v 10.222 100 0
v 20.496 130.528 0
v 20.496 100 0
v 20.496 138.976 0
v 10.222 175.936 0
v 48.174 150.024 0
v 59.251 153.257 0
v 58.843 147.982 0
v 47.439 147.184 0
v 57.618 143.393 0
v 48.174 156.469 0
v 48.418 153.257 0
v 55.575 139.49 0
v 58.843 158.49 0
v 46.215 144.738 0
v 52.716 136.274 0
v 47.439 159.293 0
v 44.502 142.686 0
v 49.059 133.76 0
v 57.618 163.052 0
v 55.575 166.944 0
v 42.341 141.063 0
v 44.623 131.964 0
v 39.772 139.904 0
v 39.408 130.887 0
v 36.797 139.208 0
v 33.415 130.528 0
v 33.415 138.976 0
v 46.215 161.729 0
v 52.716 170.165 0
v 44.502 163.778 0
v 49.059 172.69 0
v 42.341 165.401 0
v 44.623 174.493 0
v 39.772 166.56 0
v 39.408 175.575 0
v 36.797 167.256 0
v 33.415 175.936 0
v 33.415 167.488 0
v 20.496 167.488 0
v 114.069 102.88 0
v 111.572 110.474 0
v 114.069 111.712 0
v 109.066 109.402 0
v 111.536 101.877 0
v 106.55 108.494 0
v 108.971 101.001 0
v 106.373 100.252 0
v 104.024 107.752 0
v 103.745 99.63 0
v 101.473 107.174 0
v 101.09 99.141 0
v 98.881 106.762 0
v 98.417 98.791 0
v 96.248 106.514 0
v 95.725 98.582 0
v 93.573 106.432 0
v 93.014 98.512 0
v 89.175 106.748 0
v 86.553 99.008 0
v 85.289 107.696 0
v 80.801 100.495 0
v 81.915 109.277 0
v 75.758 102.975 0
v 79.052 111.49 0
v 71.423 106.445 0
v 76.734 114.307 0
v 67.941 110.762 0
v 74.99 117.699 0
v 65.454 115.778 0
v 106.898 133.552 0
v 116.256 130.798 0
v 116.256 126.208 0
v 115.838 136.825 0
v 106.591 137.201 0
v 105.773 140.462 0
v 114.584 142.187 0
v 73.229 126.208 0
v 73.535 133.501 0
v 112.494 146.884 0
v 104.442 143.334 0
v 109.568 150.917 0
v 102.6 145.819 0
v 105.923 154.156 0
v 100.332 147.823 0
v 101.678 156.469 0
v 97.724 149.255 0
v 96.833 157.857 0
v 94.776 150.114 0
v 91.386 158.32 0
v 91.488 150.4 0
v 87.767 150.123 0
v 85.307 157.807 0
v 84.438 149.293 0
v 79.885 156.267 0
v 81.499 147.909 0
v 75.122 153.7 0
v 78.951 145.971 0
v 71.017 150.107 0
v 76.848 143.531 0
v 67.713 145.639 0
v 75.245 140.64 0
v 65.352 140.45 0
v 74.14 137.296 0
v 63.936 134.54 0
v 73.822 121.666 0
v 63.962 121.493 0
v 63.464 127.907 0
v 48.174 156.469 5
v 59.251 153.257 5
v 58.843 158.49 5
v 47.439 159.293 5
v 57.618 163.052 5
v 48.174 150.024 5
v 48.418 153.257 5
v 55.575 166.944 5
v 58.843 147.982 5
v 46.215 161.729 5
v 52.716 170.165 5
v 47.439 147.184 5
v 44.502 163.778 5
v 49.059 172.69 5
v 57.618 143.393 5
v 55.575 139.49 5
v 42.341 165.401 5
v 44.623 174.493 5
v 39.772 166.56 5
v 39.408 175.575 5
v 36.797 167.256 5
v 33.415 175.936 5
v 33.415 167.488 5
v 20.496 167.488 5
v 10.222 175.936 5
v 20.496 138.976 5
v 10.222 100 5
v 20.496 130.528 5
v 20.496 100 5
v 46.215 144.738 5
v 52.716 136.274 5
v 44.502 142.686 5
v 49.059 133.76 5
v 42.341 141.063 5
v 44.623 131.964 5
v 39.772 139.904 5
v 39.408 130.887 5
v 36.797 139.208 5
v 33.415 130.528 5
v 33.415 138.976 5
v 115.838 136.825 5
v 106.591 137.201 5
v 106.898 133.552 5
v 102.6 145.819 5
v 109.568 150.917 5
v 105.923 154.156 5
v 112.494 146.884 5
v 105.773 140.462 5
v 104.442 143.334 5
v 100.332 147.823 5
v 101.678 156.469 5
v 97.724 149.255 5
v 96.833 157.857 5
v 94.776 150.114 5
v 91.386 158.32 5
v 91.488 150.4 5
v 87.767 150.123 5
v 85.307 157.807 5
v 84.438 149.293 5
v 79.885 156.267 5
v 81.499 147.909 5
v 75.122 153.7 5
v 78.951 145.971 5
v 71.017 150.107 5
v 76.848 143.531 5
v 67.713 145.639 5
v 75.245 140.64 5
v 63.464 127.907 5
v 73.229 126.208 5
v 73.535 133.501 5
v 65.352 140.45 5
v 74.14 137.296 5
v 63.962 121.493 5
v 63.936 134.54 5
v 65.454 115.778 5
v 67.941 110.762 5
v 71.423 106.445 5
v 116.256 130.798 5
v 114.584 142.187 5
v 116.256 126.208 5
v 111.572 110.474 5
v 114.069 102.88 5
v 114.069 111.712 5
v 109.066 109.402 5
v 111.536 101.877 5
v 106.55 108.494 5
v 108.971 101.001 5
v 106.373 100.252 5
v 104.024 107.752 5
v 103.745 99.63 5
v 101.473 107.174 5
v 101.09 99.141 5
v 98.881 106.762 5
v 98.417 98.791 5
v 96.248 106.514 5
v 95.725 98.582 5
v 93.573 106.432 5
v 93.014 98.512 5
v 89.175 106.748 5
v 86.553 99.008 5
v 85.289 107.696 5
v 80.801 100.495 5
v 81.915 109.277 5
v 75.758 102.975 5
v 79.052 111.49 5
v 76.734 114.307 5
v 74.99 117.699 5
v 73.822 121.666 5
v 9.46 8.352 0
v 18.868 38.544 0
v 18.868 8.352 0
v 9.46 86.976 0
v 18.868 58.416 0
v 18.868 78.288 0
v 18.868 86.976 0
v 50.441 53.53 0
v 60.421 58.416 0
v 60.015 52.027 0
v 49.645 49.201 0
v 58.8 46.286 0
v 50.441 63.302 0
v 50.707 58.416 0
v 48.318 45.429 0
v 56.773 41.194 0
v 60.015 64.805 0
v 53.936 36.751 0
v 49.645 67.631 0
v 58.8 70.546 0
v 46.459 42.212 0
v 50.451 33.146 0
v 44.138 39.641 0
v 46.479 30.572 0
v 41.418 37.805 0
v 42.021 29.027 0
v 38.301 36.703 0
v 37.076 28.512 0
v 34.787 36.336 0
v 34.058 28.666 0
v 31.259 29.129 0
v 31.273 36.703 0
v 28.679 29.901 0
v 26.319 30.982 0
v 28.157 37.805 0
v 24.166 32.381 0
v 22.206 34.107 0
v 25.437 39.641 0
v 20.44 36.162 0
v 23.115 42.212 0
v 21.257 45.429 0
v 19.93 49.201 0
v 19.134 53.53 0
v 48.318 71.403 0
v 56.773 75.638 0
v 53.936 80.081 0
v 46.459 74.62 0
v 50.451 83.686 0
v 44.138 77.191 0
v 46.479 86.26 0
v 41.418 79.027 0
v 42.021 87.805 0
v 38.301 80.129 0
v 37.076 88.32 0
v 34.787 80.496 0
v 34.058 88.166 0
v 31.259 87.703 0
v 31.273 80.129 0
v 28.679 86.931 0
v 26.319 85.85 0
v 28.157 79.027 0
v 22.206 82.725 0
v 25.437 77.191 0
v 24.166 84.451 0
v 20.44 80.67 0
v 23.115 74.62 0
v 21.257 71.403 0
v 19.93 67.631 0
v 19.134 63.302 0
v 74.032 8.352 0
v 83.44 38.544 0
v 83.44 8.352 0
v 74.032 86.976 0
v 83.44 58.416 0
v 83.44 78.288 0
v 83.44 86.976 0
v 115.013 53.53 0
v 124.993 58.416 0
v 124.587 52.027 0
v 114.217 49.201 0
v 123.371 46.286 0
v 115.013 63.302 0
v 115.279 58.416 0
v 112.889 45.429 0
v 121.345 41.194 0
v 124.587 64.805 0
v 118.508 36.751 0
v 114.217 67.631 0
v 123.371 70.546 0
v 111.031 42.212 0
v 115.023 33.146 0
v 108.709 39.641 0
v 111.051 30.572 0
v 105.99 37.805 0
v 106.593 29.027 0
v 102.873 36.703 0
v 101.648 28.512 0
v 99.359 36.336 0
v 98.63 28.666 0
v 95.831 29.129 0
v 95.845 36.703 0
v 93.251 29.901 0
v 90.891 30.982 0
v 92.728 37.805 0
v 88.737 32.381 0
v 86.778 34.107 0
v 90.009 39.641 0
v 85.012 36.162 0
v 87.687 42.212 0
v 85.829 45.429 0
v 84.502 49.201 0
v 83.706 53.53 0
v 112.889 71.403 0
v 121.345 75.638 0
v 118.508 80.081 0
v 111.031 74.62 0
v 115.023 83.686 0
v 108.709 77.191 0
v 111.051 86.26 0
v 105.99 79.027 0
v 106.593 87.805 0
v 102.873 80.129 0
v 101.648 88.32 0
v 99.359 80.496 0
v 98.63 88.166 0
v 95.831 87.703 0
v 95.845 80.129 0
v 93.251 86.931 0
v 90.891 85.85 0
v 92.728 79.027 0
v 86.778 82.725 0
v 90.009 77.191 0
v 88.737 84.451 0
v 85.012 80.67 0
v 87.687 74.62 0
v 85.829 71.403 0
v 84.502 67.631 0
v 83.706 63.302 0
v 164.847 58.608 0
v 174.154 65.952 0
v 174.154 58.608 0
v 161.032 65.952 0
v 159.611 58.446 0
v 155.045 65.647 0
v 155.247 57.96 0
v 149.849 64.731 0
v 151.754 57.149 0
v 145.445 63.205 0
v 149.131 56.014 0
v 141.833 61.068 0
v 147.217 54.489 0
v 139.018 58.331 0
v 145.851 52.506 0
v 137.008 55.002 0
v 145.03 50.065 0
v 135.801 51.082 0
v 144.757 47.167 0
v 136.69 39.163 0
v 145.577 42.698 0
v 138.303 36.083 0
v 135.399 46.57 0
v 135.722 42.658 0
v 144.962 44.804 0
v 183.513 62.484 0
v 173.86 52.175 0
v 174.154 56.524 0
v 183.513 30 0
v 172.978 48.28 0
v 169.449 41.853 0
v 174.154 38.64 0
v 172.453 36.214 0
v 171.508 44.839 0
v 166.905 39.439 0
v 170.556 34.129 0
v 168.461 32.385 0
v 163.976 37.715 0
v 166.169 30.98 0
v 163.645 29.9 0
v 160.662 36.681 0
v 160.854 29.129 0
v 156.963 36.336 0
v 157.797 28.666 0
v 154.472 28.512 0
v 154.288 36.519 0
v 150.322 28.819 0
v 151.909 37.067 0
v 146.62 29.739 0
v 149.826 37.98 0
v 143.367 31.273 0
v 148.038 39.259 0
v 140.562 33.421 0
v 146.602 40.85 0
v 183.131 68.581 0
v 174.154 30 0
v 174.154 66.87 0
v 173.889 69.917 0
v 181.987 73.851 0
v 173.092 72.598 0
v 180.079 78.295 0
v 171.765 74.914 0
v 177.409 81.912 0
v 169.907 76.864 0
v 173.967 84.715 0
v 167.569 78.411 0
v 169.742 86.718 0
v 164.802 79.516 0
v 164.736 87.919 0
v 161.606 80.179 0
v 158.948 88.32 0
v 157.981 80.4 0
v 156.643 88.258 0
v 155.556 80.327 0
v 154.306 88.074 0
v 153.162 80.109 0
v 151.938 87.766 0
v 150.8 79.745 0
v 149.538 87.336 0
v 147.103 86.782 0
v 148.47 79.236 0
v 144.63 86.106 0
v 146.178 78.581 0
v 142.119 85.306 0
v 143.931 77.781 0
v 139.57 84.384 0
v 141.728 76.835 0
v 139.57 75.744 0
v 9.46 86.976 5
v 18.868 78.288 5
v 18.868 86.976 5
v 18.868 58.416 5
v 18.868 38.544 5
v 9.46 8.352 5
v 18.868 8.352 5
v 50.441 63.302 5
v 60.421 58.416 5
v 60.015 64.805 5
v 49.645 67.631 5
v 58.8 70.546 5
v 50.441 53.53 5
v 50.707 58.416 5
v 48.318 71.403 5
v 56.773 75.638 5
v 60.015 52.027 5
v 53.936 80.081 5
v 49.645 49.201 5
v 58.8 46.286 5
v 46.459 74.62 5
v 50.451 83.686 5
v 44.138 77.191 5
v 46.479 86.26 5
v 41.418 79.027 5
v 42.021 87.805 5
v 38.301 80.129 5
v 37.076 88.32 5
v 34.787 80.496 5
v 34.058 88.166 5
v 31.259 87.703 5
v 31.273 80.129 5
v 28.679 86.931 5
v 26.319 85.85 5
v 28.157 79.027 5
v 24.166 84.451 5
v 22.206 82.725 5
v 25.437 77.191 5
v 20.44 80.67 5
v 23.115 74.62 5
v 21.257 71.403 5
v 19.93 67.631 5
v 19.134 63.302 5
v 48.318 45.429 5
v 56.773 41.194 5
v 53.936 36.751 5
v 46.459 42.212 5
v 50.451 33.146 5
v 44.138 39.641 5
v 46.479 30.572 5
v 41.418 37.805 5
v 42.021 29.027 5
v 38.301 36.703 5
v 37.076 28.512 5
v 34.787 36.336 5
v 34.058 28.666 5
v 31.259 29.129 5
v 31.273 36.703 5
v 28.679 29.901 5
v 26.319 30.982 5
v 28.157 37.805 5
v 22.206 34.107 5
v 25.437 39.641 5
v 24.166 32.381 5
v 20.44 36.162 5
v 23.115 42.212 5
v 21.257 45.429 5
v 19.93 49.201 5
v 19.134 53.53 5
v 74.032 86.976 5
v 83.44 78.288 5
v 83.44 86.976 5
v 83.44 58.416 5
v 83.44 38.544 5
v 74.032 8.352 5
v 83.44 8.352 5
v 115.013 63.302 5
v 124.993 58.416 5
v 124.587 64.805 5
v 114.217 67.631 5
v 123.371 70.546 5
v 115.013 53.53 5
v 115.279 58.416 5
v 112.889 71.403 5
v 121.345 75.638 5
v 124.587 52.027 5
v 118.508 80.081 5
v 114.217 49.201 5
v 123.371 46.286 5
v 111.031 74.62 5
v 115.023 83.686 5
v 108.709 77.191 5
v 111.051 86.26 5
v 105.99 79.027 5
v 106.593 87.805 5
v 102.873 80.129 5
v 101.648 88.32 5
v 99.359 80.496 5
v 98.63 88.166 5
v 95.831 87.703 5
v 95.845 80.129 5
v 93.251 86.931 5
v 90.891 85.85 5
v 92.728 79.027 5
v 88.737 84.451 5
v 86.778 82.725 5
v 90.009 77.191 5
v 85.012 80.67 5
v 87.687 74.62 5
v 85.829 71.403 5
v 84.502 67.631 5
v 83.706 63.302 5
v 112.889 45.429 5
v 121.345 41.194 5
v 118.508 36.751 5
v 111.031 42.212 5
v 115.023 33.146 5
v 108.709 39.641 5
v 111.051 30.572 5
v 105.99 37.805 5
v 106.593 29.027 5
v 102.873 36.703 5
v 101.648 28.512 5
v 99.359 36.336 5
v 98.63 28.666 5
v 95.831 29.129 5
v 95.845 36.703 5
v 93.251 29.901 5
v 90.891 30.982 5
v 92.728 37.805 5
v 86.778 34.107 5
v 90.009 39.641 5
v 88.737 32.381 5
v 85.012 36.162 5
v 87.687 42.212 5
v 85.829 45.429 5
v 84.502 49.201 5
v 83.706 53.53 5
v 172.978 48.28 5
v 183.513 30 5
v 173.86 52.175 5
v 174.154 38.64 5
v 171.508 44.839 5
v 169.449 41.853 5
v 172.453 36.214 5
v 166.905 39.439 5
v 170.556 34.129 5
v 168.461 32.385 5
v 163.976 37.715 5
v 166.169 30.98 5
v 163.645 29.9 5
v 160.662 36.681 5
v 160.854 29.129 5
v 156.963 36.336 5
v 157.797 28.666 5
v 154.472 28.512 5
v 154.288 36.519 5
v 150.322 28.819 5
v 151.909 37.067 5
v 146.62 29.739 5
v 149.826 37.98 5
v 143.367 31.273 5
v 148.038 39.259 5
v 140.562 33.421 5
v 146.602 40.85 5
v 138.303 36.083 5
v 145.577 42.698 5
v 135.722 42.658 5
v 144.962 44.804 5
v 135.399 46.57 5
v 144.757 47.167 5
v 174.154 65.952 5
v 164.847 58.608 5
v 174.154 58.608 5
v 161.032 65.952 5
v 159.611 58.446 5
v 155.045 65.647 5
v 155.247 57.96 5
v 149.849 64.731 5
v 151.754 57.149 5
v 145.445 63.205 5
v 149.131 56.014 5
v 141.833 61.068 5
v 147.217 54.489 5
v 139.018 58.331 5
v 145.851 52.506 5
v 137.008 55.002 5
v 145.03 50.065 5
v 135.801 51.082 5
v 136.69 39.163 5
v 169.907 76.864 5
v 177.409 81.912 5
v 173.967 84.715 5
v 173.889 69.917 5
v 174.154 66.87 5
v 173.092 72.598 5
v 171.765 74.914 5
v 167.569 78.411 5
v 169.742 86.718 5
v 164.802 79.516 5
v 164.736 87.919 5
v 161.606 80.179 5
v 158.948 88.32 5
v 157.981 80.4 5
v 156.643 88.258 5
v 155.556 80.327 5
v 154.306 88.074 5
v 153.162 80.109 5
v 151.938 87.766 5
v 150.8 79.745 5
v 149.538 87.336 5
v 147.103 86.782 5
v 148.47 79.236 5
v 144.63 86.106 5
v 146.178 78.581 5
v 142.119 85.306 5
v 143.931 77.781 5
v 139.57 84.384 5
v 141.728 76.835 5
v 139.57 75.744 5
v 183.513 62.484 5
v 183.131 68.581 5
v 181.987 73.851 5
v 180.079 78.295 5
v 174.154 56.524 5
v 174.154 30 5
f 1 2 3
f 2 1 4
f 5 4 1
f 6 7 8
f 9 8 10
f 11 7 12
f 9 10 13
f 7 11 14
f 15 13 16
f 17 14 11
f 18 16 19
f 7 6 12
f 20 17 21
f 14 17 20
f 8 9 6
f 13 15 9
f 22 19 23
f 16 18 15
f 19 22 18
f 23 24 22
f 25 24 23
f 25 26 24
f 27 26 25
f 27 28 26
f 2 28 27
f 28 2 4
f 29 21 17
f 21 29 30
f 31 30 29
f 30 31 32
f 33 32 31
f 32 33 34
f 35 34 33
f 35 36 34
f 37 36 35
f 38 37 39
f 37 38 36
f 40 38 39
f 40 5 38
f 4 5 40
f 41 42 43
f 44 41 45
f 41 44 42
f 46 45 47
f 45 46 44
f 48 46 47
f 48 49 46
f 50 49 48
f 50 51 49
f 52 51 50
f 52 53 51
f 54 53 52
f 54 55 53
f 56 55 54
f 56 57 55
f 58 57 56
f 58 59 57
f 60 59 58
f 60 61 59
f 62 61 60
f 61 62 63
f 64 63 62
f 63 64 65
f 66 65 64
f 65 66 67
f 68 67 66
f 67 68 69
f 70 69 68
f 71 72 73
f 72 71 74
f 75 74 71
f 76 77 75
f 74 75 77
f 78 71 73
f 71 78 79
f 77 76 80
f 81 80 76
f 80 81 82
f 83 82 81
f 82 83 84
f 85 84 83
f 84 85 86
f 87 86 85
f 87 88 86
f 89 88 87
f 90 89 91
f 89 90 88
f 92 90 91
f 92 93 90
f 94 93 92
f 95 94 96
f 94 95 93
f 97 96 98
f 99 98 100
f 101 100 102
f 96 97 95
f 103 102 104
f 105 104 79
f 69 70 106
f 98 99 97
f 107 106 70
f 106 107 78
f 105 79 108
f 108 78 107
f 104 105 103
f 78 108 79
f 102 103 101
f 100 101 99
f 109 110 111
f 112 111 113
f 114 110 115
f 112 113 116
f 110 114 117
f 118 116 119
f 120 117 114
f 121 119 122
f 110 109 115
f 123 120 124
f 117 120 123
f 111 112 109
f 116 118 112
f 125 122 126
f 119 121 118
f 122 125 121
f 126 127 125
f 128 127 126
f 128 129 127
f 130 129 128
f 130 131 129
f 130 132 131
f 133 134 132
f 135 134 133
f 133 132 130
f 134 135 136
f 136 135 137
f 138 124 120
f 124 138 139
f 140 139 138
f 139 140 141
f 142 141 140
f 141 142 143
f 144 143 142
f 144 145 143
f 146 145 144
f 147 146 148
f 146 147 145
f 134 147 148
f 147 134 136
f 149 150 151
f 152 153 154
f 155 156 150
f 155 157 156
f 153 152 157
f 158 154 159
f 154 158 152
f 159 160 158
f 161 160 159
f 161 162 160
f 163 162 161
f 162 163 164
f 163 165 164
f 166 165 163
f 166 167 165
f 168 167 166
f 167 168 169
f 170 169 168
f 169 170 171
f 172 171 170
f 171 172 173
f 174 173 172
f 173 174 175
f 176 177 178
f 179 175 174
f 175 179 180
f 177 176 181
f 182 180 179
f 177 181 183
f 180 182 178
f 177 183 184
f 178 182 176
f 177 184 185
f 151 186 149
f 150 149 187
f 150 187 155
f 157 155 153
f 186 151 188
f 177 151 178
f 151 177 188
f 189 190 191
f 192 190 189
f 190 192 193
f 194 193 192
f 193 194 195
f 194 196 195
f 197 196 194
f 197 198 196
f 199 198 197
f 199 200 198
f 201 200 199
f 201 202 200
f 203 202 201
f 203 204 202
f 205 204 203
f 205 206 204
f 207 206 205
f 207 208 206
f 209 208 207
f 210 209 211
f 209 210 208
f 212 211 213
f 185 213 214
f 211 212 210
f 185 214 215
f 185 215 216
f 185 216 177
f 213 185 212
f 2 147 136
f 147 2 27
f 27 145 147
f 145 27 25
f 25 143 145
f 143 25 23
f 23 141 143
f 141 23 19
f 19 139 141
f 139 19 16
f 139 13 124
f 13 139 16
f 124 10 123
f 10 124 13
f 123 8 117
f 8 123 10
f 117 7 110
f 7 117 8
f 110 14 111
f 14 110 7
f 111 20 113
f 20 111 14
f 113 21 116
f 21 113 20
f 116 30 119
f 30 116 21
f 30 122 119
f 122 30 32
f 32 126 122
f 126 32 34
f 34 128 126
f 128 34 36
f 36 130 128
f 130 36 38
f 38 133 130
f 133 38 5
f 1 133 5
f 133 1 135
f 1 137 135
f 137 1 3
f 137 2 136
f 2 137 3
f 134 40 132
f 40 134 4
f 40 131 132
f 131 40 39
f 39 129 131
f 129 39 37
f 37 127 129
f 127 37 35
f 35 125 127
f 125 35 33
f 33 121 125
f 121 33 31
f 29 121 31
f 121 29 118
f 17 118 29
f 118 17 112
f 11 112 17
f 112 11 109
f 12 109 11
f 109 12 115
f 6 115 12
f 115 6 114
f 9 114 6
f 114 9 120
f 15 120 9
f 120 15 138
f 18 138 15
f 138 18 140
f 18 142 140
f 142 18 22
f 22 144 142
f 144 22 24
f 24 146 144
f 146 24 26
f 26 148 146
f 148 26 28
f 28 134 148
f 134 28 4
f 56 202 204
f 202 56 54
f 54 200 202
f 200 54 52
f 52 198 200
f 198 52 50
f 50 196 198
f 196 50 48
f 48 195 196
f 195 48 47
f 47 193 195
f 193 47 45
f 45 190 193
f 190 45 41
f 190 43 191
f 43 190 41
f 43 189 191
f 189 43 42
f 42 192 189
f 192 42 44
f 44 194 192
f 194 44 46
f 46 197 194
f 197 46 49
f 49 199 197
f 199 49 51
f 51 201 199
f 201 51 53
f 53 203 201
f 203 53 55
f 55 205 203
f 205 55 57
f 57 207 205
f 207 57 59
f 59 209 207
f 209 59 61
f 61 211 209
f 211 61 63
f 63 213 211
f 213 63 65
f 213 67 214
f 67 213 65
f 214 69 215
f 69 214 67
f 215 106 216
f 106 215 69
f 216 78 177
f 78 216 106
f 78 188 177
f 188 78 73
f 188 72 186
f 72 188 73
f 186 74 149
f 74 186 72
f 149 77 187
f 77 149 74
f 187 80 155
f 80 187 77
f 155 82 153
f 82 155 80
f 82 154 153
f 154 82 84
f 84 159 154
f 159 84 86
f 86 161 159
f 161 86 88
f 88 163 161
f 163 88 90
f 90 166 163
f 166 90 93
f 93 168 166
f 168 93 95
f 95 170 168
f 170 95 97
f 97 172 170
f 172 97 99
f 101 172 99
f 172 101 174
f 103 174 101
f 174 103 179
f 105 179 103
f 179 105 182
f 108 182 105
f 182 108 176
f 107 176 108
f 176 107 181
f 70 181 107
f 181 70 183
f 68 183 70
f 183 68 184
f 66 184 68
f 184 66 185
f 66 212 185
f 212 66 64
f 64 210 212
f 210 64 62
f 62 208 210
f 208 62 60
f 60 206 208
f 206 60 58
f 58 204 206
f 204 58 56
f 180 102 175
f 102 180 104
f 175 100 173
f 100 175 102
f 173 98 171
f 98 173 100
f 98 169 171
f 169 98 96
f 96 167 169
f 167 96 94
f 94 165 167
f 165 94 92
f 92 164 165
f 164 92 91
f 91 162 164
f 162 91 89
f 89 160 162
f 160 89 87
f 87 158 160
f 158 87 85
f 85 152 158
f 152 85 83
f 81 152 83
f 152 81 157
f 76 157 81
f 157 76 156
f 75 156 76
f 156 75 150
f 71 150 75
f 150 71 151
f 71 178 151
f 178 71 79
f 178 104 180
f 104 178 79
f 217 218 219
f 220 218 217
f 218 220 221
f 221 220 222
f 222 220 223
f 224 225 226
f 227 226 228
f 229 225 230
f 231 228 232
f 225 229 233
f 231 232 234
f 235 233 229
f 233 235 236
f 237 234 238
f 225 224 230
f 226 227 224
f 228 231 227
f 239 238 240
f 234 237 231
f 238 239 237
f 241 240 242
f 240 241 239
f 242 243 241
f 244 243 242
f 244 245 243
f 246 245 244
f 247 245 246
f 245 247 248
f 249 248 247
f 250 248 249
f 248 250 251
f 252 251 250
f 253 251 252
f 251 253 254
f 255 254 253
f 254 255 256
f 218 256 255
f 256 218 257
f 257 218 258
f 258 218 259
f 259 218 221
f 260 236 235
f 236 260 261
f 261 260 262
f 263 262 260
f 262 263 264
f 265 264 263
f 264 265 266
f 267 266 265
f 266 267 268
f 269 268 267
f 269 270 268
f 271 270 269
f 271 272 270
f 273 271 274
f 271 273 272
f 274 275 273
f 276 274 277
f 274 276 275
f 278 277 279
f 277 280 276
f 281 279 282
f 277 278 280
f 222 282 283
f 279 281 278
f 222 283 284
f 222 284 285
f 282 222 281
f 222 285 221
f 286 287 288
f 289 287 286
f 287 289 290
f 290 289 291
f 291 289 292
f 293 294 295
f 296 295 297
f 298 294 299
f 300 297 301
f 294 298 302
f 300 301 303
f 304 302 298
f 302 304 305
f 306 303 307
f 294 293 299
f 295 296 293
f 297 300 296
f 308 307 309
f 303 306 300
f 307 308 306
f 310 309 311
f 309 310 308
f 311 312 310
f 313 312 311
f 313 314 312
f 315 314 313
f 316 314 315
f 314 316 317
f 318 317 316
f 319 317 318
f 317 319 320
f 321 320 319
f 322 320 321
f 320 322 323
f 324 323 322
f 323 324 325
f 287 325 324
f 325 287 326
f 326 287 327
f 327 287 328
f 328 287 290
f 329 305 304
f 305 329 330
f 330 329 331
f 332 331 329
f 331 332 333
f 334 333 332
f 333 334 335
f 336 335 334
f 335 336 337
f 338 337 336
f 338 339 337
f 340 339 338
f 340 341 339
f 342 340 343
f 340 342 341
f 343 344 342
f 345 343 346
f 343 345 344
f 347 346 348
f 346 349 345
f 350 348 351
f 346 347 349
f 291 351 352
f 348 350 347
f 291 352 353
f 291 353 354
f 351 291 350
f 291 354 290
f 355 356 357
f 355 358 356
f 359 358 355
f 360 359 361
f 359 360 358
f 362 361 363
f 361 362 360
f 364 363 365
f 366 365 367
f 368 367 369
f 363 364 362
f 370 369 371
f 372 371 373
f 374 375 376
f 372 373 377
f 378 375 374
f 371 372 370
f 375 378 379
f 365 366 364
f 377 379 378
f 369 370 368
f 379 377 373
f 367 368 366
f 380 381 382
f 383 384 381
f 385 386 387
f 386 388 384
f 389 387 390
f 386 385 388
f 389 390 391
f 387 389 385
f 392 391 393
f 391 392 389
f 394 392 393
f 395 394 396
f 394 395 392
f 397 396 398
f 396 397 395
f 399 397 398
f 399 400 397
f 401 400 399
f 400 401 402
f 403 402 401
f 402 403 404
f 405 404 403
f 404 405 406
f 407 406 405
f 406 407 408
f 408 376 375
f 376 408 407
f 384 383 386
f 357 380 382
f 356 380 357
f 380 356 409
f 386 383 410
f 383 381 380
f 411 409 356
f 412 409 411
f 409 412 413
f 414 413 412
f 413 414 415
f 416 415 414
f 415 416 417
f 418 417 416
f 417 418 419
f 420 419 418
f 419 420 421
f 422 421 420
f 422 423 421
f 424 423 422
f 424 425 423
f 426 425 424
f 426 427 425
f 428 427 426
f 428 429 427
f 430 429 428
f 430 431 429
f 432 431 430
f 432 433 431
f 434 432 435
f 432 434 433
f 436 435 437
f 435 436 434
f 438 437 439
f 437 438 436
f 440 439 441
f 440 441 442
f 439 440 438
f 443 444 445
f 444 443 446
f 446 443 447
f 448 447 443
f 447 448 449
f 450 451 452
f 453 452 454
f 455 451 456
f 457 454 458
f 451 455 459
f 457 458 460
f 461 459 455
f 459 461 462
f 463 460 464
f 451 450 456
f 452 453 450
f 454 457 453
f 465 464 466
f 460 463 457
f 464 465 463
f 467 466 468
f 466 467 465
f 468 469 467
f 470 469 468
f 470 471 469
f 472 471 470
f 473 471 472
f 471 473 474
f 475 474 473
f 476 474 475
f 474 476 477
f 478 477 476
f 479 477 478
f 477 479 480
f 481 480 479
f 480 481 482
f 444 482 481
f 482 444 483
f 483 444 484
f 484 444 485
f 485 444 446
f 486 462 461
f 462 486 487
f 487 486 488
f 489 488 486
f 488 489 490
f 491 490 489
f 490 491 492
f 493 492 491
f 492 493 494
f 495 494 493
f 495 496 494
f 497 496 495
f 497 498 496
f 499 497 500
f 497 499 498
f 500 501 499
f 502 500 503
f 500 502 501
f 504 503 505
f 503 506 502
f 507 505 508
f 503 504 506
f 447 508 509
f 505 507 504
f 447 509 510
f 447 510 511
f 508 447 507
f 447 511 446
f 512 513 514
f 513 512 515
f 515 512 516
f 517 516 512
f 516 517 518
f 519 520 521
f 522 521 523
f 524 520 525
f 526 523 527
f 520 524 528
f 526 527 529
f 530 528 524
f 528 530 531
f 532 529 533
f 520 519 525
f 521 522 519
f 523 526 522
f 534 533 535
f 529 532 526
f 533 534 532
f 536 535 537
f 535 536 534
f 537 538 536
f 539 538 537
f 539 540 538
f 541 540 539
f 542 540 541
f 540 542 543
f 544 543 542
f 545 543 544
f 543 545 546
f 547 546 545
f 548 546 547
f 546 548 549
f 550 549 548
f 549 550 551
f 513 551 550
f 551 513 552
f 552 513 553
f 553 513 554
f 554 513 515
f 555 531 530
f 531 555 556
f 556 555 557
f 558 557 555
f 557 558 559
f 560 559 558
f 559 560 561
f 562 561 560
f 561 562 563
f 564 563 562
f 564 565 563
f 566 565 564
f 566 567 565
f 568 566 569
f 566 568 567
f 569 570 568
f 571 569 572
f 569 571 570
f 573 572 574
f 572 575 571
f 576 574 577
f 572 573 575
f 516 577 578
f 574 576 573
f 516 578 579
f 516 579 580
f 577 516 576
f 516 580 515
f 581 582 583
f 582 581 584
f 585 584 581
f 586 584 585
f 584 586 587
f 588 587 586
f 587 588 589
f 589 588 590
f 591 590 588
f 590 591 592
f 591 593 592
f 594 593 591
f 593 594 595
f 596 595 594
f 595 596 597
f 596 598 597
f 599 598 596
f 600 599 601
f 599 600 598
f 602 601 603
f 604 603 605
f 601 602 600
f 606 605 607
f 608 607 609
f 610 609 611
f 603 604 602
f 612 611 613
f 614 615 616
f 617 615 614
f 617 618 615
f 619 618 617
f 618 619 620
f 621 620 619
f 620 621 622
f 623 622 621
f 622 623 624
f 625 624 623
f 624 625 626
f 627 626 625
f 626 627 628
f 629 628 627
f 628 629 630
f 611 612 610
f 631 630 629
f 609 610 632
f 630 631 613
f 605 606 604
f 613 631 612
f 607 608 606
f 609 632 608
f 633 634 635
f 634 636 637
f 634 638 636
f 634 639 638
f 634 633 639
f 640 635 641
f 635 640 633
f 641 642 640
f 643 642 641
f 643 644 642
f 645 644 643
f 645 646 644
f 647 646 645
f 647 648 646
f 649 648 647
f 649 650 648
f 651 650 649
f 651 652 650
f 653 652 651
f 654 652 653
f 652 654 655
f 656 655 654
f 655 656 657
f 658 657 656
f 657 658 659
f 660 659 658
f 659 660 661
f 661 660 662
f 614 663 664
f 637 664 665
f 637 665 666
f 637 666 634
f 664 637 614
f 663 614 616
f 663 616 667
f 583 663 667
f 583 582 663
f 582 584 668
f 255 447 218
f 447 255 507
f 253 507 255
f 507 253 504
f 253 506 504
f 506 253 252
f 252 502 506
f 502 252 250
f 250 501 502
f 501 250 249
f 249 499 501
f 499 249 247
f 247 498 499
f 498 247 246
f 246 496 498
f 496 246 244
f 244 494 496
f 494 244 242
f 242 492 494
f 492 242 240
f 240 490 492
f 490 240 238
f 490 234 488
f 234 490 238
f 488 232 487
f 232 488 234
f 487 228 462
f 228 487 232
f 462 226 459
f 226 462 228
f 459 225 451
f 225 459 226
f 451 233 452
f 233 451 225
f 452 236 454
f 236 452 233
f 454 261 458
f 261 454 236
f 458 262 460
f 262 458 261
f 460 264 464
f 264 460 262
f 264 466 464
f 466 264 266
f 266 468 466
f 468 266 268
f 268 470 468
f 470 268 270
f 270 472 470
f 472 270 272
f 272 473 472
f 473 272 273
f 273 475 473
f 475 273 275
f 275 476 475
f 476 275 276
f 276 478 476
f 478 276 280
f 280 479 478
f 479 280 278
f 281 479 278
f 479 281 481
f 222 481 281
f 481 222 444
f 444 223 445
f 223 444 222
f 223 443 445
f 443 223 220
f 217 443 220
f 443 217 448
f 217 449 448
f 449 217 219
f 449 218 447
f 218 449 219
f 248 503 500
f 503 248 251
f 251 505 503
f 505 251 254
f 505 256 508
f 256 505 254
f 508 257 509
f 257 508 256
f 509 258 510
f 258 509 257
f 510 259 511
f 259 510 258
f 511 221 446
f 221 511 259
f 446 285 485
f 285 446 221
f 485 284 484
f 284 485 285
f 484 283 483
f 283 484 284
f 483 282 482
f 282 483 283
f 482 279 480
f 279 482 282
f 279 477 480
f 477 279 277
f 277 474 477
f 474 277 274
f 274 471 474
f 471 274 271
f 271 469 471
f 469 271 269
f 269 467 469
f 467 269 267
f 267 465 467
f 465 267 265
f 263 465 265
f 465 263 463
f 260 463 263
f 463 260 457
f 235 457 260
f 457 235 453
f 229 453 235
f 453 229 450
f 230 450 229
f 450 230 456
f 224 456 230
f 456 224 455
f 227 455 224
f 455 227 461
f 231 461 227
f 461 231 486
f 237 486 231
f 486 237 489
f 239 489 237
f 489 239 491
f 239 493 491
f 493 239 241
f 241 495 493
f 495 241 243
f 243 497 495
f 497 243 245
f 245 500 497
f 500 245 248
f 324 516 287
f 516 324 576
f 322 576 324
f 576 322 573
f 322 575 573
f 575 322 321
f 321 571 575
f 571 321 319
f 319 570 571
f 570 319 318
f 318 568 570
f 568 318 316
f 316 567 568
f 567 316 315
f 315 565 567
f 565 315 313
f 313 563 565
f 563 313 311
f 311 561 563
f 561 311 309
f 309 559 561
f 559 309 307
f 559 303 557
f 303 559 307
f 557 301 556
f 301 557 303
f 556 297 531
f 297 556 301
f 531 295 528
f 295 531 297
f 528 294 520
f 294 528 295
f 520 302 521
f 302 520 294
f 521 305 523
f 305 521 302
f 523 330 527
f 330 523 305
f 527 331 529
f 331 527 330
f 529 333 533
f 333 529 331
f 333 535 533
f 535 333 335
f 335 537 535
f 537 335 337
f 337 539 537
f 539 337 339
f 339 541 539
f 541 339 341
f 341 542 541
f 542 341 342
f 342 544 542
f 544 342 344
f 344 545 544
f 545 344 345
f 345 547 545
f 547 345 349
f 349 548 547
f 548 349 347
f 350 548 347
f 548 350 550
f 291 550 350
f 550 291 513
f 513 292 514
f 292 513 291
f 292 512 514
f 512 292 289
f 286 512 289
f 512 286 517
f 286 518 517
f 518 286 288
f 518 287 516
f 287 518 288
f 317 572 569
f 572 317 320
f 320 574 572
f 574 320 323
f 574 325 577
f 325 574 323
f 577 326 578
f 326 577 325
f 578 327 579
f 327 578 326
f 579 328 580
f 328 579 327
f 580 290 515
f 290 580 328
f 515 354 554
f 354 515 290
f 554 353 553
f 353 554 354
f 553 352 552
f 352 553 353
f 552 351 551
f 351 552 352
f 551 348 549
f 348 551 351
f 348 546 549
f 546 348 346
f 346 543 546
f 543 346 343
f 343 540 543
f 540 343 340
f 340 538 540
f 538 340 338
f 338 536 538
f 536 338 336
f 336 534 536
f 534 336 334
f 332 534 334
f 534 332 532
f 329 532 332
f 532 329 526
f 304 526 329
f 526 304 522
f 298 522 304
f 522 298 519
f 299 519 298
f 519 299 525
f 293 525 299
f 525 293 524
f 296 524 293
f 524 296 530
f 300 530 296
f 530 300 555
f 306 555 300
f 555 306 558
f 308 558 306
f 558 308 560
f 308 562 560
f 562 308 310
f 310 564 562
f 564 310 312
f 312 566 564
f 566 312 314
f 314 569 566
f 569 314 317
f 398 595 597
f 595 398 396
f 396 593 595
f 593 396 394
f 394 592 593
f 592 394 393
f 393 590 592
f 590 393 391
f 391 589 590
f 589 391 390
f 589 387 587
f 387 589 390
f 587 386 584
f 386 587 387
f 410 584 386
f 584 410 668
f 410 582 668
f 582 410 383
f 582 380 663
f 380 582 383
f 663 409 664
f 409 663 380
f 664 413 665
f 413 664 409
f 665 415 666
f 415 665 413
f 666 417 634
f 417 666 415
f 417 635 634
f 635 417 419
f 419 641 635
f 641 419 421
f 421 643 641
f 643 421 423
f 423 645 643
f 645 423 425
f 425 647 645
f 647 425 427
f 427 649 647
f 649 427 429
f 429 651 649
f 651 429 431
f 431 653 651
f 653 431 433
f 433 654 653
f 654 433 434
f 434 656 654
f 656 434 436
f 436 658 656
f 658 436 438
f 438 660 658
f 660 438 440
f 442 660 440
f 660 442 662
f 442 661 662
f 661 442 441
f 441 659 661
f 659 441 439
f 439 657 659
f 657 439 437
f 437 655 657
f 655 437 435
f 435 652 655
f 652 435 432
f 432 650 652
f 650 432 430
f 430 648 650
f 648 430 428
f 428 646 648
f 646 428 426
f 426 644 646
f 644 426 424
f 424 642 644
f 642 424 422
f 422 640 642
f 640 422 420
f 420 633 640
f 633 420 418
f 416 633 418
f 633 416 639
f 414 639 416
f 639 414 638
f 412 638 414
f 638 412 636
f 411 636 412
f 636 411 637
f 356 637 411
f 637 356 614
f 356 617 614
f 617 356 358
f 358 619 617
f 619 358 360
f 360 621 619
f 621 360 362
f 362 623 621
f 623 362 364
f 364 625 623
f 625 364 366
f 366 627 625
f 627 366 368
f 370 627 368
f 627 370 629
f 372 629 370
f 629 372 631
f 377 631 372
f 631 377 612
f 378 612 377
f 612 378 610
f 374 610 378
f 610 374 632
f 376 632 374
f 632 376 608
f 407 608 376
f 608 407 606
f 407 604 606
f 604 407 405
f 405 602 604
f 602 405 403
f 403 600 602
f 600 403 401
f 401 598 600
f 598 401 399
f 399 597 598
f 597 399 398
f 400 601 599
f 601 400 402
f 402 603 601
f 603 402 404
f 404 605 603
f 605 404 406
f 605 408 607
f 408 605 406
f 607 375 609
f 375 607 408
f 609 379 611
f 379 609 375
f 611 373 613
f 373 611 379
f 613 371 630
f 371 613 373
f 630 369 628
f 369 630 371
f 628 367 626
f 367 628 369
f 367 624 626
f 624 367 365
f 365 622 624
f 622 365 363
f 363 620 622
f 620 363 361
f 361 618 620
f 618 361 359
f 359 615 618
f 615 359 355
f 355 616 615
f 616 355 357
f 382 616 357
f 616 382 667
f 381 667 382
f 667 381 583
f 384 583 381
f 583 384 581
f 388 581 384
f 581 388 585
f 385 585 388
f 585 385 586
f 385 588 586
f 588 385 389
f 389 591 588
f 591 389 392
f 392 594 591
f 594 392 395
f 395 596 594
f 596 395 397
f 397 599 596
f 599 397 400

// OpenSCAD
// Team logo to be used with glued magnets


translate ([0,100,0]) linear_extrude(5) text("Pe",font="Peppa Pig:Medium", size=75);
translate ([0,30,0]) linear_extrude(5) text("ppa",font="Peppa Pig:Medium", size=75);
